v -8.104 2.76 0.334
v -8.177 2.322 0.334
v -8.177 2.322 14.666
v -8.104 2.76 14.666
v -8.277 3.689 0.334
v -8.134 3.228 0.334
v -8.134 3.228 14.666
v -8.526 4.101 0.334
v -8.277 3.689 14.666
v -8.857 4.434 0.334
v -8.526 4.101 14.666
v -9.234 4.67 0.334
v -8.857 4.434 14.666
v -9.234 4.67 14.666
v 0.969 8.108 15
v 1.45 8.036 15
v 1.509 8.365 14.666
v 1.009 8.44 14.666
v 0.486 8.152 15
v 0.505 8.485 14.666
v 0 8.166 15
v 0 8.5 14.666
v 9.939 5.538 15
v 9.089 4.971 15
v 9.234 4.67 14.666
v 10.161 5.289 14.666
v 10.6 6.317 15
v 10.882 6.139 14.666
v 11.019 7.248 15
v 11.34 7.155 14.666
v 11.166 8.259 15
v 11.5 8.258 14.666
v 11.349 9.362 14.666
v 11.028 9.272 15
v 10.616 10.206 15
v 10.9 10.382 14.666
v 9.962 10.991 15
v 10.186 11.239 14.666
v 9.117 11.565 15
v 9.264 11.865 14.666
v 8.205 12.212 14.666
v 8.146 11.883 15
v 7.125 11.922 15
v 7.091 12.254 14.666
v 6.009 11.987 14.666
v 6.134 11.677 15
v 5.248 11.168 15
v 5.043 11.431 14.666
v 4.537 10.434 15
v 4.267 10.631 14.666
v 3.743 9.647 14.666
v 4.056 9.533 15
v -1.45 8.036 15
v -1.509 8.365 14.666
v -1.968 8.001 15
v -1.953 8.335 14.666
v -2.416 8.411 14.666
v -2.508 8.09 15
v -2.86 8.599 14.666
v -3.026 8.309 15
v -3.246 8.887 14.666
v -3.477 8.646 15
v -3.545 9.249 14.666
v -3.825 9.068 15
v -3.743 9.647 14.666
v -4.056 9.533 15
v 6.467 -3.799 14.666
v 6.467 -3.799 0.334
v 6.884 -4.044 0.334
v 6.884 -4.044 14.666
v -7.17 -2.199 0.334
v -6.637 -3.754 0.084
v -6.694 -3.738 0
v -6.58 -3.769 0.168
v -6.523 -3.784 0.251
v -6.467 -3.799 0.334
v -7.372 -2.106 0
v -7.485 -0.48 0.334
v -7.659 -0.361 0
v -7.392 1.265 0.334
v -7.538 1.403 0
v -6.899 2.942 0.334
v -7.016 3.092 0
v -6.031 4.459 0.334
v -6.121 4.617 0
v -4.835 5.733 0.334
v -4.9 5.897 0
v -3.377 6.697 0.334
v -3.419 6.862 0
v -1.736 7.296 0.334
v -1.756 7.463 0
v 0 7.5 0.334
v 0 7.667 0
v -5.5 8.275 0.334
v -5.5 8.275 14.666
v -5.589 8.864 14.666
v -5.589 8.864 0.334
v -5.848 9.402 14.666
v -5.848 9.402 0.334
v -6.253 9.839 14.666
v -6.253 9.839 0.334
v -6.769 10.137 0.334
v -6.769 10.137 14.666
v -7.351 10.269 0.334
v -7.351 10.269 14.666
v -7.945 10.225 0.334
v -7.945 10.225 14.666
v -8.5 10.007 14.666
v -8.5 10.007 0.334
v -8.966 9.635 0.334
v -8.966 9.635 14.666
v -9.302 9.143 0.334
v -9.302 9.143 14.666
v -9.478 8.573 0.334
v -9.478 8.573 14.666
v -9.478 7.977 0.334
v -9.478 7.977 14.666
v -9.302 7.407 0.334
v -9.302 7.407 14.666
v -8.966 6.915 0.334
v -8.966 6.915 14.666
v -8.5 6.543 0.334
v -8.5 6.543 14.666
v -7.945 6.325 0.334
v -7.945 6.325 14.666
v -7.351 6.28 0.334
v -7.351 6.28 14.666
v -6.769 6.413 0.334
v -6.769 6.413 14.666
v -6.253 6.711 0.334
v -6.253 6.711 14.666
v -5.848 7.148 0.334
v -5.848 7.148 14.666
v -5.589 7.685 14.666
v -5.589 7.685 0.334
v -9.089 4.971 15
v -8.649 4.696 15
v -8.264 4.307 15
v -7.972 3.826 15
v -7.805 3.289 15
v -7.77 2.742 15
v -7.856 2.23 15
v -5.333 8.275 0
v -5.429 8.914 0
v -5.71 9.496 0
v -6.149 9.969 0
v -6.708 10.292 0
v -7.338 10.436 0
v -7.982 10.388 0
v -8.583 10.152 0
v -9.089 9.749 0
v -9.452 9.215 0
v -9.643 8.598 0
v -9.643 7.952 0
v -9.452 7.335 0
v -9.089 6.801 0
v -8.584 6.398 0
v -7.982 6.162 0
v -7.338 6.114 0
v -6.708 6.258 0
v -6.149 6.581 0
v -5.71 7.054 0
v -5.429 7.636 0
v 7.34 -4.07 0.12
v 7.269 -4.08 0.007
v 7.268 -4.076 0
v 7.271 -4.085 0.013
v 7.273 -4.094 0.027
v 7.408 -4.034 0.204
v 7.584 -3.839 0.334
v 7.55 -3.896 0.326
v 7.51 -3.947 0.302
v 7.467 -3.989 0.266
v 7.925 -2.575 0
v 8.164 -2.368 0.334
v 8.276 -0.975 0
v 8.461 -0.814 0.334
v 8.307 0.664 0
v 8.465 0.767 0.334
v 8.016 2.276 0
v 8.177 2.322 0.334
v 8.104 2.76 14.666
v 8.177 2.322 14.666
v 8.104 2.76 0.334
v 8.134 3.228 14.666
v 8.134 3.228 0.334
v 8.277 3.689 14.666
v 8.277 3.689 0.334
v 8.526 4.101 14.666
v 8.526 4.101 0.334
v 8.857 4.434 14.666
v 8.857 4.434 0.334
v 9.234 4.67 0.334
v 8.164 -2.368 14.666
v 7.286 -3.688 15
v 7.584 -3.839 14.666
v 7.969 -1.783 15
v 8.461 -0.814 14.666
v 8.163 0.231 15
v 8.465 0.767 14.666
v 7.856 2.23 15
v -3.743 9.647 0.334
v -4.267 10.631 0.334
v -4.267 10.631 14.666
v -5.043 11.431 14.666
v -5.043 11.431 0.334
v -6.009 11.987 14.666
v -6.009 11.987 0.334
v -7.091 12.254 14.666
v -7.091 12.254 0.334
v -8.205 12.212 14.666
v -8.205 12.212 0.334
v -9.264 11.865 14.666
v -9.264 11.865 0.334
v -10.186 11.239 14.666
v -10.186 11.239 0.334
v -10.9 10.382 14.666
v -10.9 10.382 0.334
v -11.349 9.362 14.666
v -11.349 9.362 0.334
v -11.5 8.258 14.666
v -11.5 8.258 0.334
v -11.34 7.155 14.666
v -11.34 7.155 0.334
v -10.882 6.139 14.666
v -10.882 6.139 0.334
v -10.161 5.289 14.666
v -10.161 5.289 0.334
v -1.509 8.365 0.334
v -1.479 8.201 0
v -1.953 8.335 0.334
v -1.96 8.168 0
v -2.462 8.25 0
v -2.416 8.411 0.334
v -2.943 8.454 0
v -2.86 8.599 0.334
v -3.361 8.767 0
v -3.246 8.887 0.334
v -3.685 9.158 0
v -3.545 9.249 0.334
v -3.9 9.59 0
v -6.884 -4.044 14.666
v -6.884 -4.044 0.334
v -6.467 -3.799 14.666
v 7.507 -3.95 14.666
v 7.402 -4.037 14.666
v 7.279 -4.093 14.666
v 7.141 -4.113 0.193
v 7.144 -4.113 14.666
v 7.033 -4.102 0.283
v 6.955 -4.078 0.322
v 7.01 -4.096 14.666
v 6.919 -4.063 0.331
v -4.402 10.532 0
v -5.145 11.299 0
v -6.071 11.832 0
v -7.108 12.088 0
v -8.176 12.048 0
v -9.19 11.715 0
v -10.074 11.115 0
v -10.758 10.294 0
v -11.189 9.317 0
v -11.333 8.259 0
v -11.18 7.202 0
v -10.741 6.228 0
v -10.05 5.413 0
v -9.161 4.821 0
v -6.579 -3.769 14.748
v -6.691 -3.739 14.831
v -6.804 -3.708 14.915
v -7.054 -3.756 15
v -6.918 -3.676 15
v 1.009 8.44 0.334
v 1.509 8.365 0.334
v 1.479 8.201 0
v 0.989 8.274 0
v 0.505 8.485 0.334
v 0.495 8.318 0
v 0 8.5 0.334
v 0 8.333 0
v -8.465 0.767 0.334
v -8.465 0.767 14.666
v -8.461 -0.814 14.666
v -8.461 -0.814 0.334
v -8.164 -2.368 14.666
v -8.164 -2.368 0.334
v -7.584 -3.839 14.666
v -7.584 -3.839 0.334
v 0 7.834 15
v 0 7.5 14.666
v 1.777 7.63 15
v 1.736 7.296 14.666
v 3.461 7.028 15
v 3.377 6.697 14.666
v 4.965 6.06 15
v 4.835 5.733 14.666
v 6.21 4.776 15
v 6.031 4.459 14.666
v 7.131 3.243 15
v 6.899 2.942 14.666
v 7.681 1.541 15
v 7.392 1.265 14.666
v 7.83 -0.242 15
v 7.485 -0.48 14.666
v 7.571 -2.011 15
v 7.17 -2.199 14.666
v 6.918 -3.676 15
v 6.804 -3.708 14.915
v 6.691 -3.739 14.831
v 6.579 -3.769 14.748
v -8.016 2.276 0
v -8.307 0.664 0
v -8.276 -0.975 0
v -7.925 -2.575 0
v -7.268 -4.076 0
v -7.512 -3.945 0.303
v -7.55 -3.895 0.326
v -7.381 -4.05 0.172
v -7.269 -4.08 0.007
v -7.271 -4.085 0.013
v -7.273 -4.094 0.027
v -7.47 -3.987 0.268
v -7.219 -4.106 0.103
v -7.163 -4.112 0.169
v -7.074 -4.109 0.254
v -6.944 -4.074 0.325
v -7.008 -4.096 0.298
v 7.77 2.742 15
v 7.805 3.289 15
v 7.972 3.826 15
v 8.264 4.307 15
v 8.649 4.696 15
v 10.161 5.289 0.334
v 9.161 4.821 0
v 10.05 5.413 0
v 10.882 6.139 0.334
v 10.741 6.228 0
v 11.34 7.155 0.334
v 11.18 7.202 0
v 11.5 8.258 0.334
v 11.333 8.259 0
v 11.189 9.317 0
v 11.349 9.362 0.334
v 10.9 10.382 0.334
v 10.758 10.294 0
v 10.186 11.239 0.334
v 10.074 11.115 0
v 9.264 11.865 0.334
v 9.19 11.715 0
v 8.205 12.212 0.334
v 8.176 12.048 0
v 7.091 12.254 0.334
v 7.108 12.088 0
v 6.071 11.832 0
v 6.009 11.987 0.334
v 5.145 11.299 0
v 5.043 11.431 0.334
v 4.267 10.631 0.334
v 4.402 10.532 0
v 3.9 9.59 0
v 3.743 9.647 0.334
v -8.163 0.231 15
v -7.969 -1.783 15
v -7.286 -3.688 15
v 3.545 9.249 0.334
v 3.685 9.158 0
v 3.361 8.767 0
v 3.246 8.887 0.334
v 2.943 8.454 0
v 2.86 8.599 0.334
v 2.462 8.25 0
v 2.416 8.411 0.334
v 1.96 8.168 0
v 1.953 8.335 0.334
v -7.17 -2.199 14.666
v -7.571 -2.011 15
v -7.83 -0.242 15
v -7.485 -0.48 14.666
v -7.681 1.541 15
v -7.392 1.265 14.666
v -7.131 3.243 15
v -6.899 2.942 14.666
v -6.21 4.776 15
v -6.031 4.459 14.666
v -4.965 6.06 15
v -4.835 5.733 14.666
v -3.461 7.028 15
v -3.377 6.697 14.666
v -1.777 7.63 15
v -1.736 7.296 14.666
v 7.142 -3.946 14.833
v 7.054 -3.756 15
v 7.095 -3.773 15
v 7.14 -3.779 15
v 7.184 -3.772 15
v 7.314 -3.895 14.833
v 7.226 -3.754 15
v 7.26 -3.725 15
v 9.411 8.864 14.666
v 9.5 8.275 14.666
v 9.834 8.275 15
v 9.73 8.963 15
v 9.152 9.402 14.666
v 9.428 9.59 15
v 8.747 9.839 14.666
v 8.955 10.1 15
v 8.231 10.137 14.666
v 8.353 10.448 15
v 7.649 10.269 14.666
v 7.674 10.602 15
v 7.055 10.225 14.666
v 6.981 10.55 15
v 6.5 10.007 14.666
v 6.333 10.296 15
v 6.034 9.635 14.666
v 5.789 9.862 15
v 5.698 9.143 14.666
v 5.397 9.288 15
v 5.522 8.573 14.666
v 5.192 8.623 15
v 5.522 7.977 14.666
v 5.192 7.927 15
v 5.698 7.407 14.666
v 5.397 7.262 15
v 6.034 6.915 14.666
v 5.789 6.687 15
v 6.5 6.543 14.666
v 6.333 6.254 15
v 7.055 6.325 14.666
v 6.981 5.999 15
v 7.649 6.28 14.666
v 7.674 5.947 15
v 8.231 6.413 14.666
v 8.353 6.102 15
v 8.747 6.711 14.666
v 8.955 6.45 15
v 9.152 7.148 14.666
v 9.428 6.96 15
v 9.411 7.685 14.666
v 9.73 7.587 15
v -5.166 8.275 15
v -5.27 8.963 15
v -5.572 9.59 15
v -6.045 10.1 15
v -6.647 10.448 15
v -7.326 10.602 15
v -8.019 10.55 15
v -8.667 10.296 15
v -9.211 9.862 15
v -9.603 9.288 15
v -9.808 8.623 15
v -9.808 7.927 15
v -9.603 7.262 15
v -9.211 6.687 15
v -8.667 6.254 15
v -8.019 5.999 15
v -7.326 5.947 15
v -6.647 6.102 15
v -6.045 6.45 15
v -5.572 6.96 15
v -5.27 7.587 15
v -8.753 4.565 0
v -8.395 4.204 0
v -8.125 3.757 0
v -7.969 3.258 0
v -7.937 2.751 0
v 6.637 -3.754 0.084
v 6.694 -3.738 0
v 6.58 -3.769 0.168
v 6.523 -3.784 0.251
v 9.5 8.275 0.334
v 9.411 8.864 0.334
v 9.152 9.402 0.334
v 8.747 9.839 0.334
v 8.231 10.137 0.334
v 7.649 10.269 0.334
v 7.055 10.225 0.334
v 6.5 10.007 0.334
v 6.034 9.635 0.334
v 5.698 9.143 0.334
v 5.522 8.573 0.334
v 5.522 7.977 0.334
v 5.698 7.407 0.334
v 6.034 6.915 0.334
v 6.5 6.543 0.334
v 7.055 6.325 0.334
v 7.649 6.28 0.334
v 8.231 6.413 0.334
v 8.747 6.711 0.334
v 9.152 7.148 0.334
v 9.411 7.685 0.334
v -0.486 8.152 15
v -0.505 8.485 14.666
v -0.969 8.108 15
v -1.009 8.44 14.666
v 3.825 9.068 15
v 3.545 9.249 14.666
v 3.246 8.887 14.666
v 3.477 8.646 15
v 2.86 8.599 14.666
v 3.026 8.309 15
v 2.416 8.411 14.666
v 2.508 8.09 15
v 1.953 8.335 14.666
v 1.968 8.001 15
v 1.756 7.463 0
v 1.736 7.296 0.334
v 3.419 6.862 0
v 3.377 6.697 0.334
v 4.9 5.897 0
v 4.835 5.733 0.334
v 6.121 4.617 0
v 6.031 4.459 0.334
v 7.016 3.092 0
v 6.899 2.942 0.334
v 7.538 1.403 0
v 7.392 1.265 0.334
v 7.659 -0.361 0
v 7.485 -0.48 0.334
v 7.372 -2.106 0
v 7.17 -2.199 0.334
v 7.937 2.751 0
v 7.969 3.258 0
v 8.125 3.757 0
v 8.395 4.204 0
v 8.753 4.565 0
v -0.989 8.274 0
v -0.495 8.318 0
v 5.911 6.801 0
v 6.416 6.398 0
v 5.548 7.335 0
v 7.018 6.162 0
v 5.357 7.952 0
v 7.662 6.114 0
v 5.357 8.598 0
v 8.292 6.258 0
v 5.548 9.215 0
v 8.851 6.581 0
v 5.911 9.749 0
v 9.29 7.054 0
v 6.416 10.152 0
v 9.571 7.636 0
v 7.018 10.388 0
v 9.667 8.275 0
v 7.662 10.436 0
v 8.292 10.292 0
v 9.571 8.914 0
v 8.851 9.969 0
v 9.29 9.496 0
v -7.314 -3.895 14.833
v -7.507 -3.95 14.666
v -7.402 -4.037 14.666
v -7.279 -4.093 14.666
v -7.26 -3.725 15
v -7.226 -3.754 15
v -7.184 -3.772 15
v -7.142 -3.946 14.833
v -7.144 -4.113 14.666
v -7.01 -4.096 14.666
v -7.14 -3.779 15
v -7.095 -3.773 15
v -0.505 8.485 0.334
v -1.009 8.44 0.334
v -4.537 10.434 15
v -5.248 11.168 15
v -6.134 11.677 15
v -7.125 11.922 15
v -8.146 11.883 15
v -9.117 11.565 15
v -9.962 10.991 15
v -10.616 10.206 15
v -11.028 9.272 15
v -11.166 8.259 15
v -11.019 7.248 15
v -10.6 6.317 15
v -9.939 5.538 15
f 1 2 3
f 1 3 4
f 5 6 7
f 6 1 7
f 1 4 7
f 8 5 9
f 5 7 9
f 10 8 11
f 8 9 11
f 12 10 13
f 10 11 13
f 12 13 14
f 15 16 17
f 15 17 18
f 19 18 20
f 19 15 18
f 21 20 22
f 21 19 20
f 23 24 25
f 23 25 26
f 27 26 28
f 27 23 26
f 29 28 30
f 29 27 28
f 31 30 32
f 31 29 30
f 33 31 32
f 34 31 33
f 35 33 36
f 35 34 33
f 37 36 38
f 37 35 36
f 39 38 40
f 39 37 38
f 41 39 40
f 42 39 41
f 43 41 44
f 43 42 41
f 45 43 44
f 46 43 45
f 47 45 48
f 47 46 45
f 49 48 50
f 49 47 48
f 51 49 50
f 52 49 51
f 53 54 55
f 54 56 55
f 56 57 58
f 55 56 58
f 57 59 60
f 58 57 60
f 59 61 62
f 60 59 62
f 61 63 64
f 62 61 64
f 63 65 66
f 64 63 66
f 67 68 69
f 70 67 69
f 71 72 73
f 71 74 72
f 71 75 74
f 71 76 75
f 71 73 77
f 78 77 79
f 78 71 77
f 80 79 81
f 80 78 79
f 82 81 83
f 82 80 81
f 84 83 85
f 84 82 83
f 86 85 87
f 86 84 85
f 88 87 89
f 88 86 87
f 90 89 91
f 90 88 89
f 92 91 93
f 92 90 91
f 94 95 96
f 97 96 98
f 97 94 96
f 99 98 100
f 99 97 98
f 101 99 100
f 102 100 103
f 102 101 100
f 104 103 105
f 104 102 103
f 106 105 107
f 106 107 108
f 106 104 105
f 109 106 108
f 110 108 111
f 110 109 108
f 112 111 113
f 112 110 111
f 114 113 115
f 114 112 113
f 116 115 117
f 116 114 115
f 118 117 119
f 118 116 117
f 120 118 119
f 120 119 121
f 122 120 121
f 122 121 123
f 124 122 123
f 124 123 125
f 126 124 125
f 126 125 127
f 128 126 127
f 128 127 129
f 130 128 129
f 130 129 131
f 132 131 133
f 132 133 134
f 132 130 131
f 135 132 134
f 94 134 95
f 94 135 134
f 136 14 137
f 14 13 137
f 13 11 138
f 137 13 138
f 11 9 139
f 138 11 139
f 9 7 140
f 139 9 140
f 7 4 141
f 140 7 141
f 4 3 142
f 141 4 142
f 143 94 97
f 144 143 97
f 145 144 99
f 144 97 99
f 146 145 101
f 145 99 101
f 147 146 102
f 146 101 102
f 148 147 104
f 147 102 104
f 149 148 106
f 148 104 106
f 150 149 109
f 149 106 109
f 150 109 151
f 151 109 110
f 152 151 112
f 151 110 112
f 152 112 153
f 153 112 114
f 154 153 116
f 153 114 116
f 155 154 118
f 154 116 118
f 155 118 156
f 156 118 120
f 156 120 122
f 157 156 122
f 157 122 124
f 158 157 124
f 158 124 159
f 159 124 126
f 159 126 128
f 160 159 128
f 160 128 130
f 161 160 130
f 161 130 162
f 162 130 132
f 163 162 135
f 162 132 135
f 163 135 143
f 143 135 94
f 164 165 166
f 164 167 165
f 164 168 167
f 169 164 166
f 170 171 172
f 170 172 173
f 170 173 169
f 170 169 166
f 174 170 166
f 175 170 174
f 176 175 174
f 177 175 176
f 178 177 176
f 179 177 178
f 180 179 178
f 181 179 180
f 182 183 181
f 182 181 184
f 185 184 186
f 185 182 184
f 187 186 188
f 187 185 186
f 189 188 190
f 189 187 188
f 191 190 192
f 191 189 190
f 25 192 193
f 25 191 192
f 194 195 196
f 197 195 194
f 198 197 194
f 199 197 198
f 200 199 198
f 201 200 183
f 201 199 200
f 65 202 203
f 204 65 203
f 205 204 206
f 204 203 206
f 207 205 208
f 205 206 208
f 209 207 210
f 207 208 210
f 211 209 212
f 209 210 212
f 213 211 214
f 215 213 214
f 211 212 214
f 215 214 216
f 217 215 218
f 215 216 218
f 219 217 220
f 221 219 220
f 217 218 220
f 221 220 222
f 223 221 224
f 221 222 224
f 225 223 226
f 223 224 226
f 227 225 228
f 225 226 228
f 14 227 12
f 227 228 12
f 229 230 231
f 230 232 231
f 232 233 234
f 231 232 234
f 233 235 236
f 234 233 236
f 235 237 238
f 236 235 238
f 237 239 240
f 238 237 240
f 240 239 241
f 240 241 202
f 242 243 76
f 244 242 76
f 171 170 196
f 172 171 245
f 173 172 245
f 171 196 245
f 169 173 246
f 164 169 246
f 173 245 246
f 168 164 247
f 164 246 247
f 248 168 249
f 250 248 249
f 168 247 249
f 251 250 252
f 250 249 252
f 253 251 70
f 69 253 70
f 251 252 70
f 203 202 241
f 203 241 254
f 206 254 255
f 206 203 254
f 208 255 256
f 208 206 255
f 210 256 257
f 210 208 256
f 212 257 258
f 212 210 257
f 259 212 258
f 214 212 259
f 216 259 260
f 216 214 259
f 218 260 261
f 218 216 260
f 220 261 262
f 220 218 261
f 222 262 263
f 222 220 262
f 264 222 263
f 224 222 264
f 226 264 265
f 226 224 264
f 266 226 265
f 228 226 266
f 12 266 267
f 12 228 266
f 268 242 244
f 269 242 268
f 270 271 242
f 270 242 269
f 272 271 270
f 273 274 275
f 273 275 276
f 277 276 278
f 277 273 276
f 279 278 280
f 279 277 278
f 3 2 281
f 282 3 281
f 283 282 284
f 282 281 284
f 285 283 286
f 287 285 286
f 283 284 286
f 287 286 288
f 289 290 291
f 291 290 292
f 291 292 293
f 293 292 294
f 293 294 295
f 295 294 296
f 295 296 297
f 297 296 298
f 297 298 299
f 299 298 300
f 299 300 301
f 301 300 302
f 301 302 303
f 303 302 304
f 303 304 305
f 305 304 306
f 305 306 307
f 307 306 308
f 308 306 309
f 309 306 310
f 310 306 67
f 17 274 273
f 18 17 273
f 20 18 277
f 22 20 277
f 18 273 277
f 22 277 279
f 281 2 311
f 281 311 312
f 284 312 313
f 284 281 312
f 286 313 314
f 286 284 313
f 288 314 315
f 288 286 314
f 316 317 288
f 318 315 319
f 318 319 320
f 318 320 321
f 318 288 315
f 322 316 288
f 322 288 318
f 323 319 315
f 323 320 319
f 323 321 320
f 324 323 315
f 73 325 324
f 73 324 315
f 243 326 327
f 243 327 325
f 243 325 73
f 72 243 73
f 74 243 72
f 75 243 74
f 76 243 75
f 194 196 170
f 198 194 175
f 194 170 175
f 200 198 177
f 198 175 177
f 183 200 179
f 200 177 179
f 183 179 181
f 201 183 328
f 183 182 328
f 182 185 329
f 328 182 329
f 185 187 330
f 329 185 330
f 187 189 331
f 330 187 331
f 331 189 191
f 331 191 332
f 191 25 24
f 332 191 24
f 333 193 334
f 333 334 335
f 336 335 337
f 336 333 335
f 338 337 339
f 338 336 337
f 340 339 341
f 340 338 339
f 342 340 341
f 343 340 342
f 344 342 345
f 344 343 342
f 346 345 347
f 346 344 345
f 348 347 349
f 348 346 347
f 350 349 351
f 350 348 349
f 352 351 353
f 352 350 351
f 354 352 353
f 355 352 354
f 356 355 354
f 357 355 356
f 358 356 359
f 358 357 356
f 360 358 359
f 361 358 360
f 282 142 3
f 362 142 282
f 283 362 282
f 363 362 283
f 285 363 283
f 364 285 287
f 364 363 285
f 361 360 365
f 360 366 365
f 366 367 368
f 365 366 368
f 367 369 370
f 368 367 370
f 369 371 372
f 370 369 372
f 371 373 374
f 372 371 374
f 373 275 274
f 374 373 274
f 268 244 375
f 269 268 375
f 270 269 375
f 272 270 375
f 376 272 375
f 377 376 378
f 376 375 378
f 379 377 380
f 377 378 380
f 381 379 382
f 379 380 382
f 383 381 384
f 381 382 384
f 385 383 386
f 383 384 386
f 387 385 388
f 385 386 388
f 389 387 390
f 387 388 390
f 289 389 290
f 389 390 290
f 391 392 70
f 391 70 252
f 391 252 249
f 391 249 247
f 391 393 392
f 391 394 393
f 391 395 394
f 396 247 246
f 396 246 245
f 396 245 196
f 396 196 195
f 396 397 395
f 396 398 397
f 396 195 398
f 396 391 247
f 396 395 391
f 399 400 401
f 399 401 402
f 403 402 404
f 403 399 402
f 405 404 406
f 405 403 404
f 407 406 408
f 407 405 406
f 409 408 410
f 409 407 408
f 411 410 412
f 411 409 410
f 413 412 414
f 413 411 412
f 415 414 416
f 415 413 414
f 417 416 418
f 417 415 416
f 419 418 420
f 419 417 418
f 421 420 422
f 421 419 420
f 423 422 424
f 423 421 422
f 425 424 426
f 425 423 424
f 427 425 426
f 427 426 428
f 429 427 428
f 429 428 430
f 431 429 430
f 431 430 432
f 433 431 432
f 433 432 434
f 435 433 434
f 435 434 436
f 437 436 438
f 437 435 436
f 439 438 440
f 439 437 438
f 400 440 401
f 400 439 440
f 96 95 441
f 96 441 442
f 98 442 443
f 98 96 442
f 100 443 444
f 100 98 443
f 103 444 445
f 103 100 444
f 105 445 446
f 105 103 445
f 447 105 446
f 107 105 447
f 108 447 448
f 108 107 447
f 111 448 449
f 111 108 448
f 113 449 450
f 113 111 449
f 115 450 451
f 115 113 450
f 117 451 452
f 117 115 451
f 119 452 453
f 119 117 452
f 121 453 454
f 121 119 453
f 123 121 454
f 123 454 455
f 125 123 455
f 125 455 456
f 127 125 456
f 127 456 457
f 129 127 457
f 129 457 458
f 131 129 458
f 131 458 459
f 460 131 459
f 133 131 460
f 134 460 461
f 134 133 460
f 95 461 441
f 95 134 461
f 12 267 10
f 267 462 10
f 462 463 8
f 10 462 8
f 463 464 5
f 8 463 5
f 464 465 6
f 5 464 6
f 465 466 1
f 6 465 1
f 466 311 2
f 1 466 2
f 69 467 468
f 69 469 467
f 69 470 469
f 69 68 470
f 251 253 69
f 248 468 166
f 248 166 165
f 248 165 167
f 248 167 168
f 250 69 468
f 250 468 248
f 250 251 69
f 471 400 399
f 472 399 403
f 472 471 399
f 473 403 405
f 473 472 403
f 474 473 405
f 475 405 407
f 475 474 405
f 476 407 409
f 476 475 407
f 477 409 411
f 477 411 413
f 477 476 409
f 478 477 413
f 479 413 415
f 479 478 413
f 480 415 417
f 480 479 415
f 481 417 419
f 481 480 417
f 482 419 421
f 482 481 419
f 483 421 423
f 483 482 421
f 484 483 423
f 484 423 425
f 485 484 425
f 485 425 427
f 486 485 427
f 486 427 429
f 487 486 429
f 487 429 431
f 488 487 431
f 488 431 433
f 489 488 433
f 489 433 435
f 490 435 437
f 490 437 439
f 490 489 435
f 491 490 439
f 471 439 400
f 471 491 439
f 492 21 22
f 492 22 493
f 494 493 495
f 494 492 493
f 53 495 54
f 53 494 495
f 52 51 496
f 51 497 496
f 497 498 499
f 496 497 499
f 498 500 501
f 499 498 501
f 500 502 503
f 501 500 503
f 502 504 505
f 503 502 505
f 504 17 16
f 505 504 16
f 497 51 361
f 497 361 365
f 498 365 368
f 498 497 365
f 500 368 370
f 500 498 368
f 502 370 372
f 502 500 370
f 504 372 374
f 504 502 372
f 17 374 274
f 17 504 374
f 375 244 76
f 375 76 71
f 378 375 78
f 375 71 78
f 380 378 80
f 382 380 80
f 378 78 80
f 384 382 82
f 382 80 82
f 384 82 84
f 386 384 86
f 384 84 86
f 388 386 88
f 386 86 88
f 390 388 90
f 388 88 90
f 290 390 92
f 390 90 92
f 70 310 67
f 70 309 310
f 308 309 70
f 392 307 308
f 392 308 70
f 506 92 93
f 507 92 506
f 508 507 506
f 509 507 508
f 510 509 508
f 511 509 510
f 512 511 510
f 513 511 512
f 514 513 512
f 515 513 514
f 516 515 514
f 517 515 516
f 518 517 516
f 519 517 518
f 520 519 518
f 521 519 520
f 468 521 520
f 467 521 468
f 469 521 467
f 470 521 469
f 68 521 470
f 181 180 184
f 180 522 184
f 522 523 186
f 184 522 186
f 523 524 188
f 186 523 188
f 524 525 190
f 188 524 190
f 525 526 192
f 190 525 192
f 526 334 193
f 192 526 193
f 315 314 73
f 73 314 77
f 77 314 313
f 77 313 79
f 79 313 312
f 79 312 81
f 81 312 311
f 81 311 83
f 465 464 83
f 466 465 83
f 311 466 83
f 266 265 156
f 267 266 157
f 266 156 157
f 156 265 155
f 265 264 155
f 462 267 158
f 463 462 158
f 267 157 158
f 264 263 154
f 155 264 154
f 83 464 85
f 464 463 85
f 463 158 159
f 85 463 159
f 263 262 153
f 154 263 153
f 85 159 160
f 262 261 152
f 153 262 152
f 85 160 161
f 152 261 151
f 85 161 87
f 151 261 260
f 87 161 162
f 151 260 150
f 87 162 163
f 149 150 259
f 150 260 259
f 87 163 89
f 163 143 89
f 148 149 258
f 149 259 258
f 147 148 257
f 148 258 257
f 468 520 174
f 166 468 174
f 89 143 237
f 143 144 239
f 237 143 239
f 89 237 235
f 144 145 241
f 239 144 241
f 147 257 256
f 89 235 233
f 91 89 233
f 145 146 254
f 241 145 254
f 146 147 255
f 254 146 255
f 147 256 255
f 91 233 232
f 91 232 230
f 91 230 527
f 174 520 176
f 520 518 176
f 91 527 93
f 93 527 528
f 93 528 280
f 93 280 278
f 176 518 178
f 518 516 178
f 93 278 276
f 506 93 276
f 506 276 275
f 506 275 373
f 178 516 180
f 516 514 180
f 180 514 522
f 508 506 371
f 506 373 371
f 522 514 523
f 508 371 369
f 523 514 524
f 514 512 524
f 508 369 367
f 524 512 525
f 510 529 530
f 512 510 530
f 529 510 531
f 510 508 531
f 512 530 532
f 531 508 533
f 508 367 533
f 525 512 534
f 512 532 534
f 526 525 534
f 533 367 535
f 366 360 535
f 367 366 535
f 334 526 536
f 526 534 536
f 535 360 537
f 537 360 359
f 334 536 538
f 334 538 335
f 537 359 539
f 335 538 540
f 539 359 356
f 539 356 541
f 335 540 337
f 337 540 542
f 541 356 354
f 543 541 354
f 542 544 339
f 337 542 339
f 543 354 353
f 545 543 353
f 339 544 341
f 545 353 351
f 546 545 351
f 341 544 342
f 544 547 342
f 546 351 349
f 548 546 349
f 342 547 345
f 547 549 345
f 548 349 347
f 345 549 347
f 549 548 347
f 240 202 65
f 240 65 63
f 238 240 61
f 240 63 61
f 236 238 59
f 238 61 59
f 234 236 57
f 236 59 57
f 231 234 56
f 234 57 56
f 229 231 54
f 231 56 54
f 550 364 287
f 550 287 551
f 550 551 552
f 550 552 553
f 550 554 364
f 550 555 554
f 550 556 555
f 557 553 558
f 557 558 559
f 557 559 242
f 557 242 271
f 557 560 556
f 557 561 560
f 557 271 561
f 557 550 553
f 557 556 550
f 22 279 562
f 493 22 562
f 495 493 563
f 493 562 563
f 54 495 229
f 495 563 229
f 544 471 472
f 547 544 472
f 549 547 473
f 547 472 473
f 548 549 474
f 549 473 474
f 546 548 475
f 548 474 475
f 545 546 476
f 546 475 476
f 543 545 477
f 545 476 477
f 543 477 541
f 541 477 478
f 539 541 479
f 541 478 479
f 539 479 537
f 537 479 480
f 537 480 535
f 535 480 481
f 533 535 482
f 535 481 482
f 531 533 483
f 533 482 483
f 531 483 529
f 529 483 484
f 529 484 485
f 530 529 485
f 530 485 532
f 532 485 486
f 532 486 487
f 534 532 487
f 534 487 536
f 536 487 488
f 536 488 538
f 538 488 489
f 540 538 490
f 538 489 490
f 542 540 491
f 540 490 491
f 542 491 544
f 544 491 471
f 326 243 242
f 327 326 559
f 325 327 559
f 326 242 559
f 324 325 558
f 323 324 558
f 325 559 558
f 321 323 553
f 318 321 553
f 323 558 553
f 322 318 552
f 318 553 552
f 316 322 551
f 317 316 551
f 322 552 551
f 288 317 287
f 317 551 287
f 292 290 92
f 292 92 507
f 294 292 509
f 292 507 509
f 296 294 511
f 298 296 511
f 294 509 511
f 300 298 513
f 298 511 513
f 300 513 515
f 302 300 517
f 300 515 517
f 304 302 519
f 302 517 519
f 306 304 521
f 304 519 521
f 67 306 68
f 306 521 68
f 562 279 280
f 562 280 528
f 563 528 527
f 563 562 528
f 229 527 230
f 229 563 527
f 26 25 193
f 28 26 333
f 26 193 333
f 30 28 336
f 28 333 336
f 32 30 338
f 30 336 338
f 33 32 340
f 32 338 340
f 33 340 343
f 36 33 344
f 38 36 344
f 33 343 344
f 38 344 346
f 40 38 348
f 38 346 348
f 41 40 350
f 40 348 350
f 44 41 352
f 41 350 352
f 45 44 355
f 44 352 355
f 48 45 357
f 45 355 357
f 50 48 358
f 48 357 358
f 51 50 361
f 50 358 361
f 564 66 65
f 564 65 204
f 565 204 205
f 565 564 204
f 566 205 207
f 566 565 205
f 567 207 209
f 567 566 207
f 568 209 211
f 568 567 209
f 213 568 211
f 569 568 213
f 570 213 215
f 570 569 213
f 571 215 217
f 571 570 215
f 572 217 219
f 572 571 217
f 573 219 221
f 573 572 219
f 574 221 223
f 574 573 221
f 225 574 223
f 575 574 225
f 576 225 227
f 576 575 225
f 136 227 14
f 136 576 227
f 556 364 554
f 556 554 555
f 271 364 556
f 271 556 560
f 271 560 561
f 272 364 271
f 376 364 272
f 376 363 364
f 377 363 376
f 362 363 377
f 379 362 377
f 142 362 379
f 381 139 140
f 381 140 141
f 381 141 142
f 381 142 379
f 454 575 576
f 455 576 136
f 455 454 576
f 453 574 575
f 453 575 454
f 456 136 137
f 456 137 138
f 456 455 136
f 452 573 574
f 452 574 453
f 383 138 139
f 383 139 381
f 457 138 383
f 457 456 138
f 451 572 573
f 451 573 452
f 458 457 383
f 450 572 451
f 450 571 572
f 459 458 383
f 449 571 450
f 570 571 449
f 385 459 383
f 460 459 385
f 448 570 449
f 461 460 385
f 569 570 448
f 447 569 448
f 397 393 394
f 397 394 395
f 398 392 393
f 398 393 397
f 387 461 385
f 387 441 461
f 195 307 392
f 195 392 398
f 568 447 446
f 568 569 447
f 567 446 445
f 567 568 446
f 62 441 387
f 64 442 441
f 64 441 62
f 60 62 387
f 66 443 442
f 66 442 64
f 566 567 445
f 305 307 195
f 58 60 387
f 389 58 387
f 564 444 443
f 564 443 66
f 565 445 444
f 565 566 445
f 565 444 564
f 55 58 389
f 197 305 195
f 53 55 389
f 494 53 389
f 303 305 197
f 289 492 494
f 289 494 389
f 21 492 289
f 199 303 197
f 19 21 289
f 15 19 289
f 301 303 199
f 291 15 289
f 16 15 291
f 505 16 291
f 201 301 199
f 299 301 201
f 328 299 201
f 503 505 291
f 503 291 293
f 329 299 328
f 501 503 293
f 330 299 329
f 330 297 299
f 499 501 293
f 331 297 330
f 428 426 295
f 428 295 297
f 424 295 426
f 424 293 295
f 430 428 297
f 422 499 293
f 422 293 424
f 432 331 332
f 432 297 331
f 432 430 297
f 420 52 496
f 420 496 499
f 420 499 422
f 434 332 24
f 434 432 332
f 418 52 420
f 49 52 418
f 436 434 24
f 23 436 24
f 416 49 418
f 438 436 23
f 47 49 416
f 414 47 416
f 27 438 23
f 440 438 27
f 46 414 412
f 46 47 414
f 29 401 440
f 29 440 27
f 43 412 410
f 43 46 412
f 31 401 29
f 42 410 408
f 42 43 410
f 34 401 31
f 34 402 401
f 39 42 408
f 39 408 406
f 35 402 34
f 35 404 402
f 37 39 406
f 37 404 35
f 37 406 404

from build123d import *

# Parameters (mm, degrees)
F0_R     = 2
F1_DEPTH = 15
F2_R     = 2
F3_SIZE2 = 0.334
F3_SIZE  = 0.167
F4_R     = 0.5
F5_SIZE  = 0.334


with BuildPart() as f1:
    # F0 (on Top) → F1 (new body)
    with BuildSketch(Plane.XY):
        with BuildLine():
            ThreePointArc((0, 7.5), (6.509248113, 3.7255454638), (6.4667999415, -3.7987495992))
            Line((6.4667999415, -3.7987495992), (7.3290399337, -4.3052495457))
            ThreePointArc((7.3290399337, -4.3052495457), (8.4999852198, -0.0158512782), (7.3450462726, 4.2778844366))
            ThreePointArc((7.3450462726, 4.2778844366), (10.1862523655, 11.2386714824), (3.53743112, 7.7289443698))
            ThreePointArc((3.53743112, 7.7289443698), (1.8102448532, 8.304999312), (0, 8.5))
            Line((0, 8.5), (0, 7.5))
        make_face()
        with Locations((7.5, 8.2748819776)):
            Circle(F0_R, mode=Mode.SUBTRACT)
        with BuildLine():
            ThreePointArc((-6.4667999415, -3.7987495992), (-6.509248113, 3.7255454638), (0, 7.5))
            Line((0, 7.5), (0, 8.5))
            ThreePointArc((0, 8.5), (-1.8102448532, 8.304999312), (-3.53743112, 7.7289443698))
            ThreePointArc((-3.53743112, 7.7289443698), (-10.1862523655, 11.2386714824), (-7.3450462726, 4.2778844366))
            ThreePointArc((-7.3450462726, 4.2778844366), (-8.4999852198, -0.0158512782), (-7.3290399337, -4.3052495457))
            Line((-7.3290399337, -4.3052495457), (-6.4667999415, -3.7987495992))
        make_face()
        with Locations((-7.5, 8.2748819776)):
            Circle(F0_R, mode=Mode.SUBTRACT)
    extrude(amount=F1_DEPTH)

    # F2
    f2_edges = [f1.edges().sort_by_distance(p)[0] for p in [
        (7.345046, 4.277884, 7.5),
        (3.537431, 7.728944, 7.5),
        (-3.537431, 7.728944, 7.5),
        (-7.345046, 4.277884, 7.5),
    ]]
    fillet(f2_edges, radius=F2_R)

    # F3
    f3_edges = [f1.edges().sort_by_distance(p)[0] for p in [
        (8.431287, -1.078612, 0),
        (8.276969, 3.688682, 0),
        (6.89792, -4.052, 0),
        (10.186252, 11.238671, 0),
        (0, 7.5, 0),
        (2.859731, 8.598635, 0),
        (-6.89792, -4.052, 0),
        (0, 8.5, 0),
        (-8.431287, -1.078612, 0),
        (-2.859731, 8.598635, 0),
        (-8.276969, 3.688682, 0),
        (-10.186252, 11.238671, 0),
        (5.5, 8.274882, 0),
        (-9.5, 8.274882, 0),
    ]]
    f3_side = f1.faces().sort_by_distance((8.150047, -1.042633, 0))[0]
    chamfer(f3_edges, length=F3_SIZE, length2=F3_SIZE2, reference=f3_side)

    # F4
    f4_edges = [f1.edges().sort_by_distance(p)[0] for p in [
        (-7.32904, -4.30525, 7.667),
        (7.32904, -4.30525, 7.667),
    ]]
    fillet(f4_edges, radius=F4_R)

    # F5
    f5_edges = [f1.edges().sort_by_distance(p)[0] for p in [
        (8.460888, -0.814478, 15),
        (7.278526, -4.092712, 15),
        (8.276969, 3.688682, 15),
        (6.675617, -3.921414, 15),
        (10.186252, 11.238671, 15),
        (0, 7.5, 15),
        (2.859731, 8.598635, 15),
        (-6.675617, -3.921414, 15),
        (0, 8.5, 15),
        (-7.278526, -4.092712, 15),
        (-2.859731, 8.598635, 15),
        (-8.460888, -0.814478, 15),
        (-10.186252, 11.238671, 15),
        (-8.276969, 3.688682, 15),
        (5.5, 8.274882, 15),
        (-9.5, 8.274882, 15),
    ]]
    chamfer(f5_edges, length=F5_SIZE)


solid = f1.part
